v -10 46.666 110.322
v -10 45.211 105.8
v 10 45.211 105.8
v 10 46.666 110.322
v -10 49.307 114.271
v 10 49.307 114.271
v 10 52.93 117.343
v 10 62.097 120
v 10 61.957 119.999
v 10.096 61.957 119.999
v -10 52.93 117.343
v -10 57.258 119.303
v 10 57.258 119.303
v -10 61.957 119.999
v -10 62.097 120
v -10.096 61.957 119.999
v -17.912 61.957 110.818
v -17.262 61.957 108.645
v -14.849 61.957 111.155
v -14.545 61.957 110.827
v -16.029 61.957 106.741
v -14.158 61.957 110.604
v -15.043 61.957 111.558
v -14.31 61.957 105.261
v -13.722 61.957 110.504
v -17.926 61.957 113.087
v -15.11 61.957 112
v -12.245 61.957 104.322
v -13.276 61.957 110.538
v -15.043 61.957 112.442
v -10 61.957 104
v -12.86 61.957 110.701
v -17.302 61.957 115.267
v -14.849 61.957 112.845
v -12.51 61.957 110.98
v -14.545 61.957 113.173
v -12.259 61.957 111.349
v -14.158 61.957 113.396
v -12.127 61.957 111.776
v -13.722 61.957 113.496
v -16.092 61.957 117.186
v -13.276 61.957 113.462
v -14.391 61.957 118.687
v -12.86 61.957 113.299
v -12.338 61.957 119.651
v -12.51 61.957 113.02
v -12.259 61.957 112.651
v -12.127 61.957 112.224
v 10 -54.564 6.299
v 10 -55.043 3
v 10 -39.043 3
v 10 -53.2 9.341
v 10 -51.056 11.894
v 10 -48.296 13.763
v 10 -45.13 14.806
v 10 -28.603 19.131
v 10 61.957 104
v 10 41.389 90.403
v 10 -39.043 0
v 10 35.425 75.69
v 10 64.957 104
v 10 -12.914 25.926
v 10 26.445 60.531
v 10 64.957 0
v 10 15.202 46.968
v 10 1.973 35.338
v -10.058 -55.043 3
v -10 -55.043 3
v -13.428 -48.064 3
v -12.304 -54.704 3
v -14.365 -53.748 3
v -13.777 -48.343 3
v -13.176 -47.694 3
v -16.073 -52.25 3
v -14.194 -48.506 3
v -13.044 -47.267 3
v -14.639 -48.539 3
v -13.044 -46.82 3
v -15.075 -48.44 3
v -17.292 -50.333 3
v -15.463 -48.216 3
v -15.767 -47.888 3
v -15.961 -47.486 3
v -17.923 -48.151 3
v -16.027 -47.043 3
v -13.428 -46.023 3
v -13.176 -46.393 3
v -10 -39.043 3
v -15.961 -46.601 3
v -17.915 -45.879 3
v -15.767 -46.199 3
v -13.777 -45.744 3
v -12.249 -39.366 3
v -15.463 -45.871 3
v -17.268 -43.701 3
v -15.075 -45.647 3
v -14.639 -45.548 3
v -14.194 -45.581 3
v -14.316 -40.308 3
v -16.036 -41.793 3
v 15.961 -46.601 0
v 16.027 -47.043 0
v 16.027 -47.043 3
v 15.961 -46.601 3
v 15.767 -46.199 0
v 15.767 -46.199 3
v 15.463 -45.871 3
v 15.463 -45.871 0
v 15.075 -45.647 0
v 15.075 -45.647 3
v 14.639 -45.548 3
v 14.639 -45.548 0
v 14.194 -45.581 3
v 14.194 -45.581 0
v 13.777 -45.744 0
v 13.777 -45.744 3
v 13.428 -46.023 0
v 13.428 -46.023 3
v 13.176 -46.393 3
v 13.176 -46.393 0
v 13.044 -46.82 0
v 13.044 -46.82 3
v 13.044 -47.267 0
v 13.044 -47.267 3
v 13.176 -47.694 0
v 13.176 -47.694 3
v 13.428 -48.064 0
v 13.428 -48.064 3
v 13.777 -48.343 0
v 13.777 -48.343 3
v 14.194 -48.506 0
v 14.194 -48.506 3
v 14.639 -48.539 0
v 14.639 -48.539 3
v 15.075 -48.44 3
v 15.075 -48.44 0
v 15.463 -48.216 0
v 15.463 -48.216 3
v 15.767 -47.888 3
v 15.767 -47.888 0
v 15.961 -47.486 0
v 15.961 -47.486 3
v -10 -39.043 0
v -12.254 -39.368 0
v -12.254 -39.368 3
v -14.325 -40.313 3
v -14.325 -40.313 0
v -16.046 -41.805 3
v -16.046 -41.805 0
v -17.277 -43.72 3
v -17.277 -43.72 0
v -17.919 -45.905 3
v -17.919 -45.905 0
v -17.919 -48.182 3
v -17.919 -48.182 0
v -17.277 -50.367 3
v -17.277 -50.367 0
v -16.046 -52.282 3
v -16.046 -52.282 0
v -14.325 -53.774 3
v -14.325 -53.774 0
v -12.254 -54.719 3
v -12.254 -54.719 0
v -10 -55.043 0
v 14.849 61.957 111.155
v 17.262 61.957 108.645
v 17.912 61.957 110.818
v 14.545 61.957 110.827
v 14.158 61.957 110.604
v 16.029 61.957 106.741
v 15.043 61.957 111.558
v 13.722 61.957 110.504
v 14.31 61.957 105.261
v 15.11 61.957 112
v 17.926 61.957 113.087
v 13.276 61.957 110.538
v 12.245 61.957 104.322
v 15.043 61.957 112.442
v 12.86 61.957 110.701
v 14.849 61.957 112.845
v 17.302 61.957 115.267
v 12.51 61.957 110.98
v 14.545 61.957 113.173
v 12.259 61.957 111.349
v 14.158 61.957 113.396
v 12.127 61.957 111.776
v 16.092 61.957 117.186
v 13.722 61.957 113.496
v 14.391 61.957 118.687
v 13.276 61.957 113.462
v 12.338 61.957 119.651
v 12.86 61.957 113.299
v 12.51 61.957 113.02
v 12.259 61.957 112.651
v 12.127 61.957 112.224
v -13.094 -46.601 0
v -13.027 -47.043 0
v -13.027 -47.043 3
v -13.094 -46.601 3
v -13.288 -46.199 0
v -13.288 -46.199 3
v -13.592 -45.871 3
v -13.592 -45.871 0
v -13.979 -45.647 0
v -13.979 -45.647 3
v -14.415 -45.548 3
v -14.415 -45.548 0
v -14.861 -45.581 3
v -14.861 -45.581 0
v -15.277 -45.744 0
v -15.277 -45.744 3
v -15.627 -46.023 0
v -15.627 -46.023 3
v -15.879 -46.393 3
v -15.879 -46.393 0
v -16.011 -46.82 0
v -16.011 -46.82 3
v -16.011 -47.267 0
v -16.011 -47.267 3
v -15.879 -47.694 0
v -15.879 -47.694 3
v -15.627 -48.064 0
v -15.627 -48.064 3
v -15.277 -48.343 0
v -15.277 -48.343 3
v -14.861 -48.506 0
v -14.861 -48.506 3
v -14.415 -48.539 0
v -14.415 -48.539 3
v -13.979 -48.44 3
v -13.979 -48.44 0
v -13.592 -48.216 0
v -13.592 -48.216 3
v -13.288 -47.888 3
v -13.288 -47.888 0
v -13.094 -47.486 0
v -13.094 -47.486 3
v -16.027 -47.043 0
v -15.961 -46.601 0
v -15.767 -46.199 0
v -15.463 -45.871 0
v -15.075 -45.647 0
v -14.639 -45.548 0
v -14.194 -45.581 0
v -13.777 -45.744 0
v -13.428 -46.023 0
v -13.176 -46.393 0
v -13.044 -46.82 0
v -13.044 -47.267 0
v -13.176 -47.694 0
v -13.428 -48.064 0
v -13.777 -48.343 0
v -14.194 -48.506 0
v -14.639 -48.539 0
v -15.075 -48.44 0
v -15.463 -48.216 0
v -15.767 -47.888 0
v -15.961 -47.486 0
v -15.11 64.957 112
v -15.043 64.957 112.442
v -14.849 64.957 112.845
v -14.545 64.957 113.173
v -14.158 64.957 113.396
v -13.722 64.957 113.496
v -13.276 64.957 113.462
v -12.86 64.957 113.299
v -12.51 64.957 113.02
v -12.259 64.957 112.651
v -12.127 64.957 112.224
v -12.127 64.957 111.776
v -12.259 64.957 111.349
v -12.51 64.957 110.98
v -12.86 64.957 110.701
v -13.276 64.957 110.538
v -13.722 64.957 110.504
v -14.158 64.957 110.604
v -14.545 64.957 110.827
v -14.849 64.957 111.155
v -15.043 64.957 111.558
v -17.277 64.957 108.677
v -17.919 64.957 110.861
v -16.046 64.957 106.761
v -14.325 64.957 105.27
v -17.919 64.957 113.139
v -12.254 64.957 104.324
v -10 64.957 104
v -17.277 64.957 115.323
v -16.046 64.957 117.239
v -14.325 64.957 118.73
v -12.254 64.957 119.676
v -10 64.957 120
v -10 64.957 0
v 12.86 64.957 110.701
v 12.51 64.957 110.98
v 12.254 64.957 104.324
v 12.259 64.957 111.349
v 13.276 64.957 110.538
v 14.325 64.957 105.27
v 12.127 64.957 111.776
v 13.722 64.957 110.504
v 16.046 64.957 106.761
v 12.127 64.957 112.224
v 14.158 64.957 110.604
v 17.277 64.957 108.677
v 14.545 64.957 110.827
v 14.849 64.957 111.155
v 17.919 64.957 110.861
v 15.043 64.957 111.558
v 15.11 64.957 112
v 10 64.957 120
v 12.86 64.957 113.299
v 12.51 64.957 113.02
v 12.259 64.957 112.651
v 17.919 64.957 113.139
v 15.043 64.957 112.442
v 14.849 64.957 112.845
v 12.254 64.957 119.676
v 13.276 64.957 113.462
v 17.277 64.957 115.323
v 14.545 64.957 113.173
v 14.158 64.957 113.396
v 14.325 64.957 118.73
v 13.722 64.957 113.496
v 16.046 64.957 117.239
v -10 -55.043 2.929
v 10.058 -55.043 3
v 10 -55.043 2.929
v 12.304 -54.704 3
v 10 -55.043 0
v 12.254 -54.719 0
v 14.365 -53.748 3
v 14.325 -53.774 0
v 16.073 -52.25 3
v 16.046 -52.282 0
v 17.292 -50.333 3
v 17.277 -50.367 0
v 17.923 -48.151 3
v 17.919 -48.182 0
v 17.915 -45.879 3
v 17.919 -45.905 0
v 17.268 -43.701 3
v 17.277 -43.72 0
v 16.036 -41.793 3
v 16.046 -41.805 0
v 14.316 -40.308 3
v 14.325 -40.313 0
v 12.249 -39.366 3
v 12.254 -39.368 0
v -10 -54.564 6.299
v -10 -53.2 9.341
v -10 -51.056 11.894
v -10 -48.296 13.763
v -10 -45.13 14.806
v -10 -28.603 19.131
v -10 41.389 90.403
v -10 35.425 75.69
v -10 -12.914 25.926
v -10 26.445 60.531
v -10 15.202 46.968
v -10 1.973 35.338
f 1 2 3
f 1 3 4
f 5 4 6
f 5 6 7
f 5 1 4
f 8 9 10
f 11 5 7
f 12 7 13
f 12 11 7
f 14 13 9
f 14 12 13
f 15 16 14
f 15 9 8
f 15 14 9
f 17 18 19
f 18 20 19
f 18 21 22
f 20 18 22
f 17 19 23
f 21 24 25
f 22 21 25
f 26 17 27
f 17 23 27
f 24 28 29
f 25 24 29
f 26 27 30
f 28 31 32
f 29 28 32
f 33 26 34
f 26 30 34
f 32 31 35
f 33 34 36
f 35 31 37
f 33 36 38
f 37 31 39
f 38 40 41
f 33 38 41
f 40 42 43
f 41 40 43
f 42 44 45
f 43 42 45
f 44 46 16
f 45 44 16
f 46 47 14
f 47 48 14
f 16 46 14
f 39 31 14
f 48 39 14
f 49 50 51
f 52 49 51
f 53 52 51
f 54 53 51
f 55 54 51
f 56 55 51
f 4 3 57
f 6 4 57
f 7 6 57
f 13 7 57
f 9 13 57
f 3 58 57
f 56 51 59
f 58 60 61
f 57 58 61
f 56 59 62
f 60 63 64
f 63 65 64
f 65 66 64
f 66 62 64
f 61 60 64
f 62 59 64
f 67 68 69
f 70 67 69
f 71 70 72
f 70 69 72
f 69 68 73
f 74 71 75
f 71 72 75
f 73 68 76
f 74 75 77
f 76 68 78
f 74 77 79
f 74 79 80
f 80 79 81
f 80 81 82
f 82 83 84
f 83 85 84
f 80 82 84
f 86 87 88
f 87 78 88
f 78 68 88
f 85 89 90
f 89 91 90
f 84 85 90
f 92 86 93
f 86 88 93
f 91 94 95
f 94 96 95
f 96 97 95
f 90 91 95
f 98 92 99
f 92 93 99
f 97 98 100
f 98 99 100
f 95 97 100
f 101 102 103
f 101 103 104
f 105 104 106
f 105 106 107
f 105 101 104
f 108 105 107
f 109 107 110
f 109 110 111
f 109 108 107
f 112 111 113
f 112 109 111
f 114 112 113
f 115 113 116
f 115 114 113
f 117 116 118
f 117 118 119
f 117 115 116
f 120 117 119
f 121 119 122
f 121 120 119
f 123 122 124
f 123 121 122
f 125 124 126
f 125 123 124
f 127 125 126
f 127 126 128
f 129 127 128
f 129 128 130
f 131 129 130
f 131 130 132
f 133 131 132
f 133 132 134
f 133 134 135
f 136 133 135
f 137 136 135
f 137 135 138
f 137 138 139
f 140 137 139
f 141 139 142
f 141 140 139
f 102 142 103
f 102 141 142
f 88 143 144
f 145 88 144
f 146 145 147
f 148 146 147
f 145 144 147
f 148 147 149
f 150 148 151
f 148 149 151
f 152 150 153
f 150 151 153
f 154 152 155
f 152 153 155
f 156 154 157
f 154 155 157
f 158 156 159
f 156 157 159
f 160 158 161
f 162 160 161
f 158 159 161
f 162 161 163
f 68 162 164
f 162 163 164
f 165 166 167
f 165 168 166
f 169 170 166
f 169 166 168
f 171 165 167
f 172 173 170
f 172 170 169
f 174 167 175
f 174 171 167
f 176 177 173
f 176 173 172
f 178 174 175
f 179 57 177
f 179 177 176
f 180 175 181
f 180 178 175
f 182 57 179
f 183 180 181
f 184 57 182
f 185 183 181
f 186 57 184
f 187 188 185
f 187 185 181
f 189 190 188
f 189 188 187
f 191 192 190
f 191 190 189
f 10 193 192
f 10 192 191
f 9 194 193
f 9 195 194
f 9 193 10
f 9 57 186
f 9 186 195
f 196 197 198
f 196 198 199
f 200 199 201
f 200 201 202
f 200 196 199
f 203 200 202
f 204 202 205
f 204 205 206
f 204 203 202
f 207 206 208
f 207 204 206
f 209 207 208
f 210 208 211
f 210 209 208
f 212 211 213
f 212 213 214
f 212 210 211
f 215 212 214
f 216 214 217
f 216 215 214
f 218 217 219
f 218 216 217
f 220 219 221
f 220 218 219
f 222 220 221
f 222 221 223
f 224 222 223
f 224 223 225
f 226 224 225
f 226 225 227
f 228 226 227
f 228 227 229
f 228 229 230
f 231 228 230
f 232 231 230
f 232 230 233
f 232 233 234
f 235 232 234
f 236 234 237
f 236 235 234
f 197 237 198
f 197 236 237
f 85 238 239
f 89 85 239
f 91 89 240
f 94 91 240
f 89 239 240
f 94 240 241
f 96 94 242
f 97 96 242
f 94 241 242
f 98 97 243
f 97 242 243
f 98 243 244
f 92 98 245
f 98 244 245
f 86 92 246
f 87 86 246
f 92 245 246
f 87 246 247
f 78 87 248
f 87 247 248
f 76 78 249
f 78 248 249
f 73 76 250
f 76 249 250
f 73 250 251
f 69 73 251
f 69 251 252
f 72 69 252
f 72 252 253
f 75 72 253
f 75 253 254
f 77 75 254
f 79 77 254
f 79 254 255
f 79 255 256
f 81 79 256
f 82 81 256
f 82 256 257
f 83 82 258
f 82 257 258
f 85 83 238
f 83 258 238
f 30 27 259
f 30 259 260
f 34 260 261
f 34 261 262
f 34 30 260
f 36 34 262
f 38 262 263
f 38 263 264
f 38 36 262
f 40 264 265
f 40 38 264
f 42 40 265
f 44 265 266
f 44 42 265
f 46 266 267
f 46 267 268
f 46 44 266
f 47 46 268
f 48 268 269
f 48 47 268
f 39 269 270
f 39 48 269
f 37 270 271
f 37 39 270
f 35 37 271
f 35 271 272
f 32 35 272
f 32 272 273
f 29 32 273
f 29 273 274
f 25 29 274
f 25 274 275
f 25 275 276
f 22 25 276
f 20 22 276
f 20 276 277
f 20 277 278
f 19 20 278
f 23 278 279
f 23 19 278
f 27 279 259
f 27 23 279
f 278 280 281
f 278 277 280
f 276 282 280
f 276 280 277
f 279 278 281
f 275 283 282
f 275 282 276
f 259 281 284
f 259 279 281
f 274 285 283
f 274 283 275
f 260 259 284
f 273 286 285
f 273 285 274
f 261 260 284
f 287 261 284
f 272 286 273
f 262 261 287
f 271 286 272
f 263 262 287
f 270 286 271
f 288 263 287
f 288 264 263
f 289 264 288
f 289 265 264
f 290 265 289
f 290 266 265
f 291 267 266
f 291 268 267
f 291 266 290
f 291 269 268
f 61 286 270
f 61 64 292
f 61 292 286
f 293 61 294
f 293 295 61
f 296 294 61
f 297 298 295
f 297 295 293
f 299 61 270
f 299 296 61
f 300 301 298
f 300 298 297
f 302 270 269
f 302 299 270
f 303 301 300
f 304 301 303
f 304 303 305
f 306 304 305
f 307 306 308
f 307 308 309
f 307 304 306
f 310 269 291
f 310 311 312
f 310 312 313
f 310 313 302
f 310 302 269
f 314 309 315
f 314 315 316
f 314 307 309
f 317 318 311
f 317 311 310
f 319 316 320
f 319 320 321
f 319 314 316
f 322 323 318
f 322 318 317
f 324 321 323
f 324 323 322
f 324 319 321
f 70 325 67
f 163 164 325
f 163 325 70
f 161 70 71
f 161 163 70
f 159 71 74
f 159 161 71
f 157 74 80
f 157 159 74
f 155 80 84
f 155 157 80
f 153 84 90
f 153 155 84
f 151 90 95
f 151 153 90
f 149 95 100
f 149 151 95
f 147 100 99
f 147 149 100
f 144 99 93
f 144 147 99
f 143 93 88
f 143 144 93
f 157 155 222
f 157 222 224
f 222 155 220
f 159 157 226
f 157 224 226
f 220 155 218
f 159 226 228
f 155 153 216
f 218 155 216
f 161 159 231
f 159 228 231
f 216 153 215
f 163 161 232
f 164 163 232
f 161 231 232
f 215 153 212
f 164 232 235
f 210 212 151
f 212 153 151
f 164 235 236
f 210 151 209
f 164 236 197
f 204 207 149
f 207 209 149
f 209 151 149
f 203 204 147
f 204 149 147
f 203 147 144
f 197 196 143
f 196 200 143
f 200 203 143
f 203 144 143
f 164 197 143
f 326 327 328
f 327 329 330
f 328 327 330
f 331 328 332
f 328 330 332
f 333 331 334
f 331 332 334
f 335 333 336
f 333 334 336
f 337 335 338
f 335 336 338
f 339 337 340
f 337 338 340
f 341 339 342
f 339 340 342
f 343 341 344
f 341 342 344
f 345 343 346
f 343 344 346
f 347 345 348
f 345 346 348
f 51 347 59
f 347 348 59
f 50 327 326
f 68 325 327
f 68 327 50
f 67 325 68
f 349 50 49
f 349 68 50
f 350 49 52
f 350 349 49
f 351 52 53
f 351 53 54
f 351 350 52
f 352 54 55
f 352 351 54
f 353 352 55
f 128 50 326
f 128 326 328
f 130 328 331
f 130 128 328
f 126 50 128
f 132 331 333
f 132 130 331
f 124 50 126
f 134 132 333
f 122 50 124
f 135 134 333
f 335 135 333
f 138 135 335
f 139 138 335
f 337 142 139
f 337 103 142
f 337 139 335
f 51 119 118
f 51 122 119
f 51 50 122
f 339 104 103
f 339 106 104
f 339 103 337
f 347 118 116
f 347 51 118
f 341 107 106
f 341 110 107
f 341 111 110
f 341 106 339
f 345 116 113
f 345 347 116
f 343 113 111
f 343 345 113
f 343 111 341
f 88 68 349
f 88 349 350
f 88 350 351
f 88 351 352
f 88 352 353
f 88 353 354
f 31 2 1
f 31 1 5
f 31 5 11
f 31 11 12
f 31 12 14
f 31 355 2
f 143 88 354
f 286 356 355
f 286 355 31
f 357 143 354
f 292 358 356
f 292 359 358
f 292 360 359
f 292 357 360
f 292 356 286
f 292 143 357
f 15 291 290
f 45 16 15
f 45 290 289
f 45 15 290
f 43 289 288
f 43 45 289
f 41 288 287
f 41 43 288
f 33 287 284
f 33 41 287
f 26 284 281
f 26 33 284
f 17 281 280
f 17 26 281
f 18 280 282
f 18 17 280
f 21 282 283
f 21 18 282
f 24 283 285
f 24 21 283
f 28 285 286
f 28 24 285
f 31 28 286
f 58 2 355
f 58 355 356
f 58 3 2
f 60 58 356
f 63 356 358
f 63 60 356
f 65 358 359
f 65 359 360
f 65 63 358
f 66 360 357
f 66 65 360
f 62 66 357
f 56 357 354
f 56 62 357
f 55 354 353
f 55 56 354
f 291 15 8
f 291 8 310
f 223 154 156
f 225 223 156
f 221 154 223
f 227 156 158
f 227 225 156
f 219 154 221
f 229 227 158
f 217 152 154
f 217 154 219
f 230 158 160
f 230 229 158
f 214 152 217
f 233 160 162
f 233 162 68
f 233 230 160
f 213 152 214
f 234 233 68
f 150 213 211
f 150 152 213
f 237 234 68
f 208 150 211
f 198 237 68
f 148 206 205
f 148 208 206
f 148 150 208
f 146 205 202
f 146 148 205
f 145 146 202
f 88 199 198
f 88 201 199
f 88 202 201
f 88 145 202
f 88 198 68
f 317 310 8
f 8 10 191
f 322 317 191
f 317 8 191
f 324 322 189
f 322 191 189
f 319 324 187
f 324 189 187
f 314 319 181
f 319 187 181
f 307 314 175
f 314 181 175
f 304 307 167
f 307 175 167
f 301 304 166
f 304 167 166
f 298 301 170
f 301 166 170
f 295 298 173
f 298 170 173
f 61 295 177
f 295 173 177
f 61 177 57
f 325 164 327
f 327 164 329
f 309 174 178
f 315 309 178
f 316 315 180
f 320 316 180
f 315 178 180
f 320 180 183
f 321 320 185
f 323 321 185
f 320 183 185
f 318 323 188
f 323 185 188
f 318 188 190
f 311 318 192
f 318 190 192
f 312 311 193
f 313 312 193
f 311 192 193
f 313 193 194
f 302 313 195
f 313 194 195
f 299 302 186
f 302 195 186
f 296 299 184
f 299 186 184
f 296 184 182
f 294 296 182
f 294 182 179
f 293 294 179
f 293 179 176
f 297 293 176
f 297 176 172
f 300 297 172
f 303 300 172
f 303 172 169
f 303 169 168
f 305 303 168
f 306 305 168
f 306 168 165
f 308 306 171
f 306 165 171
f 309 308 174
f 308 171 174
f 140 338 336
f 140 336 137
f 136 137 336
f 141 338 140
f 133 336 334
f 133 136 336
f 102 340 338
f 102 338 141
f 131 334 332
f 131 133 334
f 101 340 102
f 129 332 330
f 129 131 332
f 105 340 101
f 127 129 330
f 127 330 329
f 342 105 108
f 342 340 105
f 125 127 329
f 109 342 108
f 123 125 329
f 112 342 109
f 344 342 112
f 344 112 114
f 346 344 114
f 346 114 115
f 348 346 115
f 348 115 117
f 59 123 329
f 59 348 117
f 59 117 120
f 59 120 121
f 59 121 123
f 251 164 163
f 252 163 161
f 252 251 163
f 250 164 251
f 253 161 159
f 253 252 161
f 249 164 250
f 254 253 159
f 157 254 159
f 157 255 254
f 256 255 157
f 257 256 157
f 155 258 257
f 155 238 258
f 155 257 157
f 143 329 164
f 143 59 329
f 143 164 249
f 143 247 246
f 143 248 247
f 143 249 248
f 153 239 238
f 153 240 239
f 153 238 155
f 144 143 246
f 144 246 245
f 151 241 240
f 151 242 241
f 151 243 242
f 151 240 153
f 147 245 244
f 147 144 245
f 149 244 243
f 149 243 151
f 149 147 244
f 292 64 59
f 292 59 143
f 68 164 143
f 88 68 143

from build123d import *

# Parameters (mm, degrees)
F1_DEPTH     = 15
F0_R         = 1.5
F2_DEPTH     = 3
F0_W         = 2
F0_H         = 3
F3_DEPTH     = 120
F4_DEPTH     = 120
F5_W         = 3
F5_H         = 16
F6_DEPTH     = 17
F8_DEPTH     = 3
F7_R         = 1.5
F9_DEPTH     = 3
F12_T1_DEPTH = 105.7045814642
F13_T1_DEPTH = 80.3553390593
F14_R        = 112.0195092941


# Not quite as in the source:
# - a fillet or chamfer that OpenCascade refuses, or shapes differently, is made with other operations: its cross-section is extruded or revolved along the edge and cut away or added
# - a feature names something its author has since deleted; it is built from what else it names


with BuildPart() as f1:
    # F0 (on Top) → F1 (new body)
    with BuildSketch(Plane.XY):
        Polygon((-8, 44.9565169007), (-10, 44.9565169007), (-10, -39.0434830993), (-10, -55.0434830993), (-8, -55.0434830993), align=None)
        Polygon((10, -39.0434830993), (10, 44.9565169007), (-8, 44.9565169007), (-8, -55.0434830993), (10, -55.0434830993), align=None)
    extrude(amount=F1_DEPTH)

    # F0 (on Top) → F2 (join)
    with BuildSketch(Plane.XY):
        Polygon((10, -39.0434830993), (10, 44.9565169007), (-8, 44.9565169007), (-8, -55.0434830993), (10, -55.0434830993), align=None)
        with BuildLine():
            ThreePointArc((10, -55.0434830993), (18, -47.0434830993), (10, -39.0434830993))
            Line((10, -39.0434830993), (10, -55.0434830993))
        make_face()
        with Locations((14.5272817463, -47.0434830993)):
            Circle(F0_R, mode=Mode.SUBTRACT)
    extrude(amount=F2_DEPTH)

    # F0 (on Top) → F3 (join)
    with BuildSketch(Plane.XY):
        Polygon((10, 64.9565169007), (-8, 64.9565169007), (-8, 61.9565169007), (-8, 44.9565169007), (10, 44.9565169007), align=None)
        with Locations((-9, 63.4565169007)):
            Rectangle(F0_W, F0_H)
    extrude(amount=F3_DEPTH)

    # F0 (on Top) → F4 (join, through all)
    with BuildSketch(Plane.XY):
        with Locations((-9, 63.4565169007)):
            Rectangle(F0_W, F0_H)
    extrude(amount=F4_DEPTH)

    # F5 (on face) → F6 (join)
    with BuildSketch(Plane.YZ.offset(10)):
        with Locations((63.4565169007, 112)):
            Rectangle(F5_W, F5_H)
    extrude(amount=F6_DEPTH)

    # F7 (on face) → F8 (cut, through all)
    with BuildSketch(Plane.XZ.offset(-61.9565169007)):
        with BuildLine():
            ThreePointArc((10, 120), (18, 112), (10, 104))
            Line((10, 104), (27, 104))
            Line((27, 104), (27, 120))
            Line((27, 120), (10, 120))
        make_face()
    extrude(amount=-F8_DEPTH, mode=Mode.SUBTRACT)

    # F7 (on face) → F9 (cut, through all)
    with BuildSketch(Plane.XZ.offset(-61.9565169007)):
        with Locations((13.6100761592, 112)):
            Circle(F7_R)
    extrude(amount=-F9_DEPTH, mode=Mode.SUBTRACT)

    # F11: F1 across plane


with BuildPart() as f2:
    # F0 (on Top) → F2, piece 2 (new body)
    with BuildSketch(Plane.XY):
        with BuildLine():
            Line((-10, -55.0434830993), (-10, -39.0434830993))
            ThreePointArc((-10, -39.0434830993), (-18, -47.0434830993), (-10, -55.0434830993))
        make_face()
        with Locations((-14.5272817463, -47.0434830993)):
            Circle(F0_R, mode=Mode.SUBTRACT)
    extrude(amount=F2_DEPTH)


with BuildPart() as f1_1:
    add(f1.part)
    add(f1.part.mirror(Plane(origin=(0, 64.9565169007, 120), x_dir=(0, 1, 0), z_dir=(1, 0, 0))))

    # F12: fillet of radius 17.1409162928 on 1 edges, made by hand

    # F12_s2 → F12_t1 (cut)
    with BuildSketch(Plane.YZ.offset(-52.8522907321)):
        with BuildLine():
            ThreePointArc((44.9565169007, 102.8590837072), (49.9769750471, 114.9795418536), (62.0974331935, 120))
            Line((62.0974331935, 120), (44.9565169007, 120))
            Line((44.9565169007, 120), (44.9565169007, 102.8590837072))
        make_face()
    extrude(amount=F12_T1_DEPTH, mode=Mode.SUBTRACT)

    # F13: fillet of radius 12.0710678119 on 1 edges, made by hand

    # F13_s2 → F13_t1 (cut)
    with BuildSketch(Plane.YZ.offset(-40.1776695297)):
        with BuildLine():
            ThreePointArc((-55.0434830993, 2.9289321881), (-51.5079491934, 11.4644660941), (-42.9724152874, 15))
            Line((-42.9724152874, 15), (-55.0434830993, 15))
            Line((-55.0434830993, 15), (-55.0434830993, 2.9289321881))
        make_face()
    extrude(amount=F13_T1_DEPTH, mode=Mode.SUBTRACT)

    # F14
    f14_edges = [f1_1.edges().sort_by_distance(p)[0] for p in [
        (0, 44.956517, 15),
    ]]
    fillet(f14_edges, radius=F14_R)


solid = Compound([f2.part, f1_1.part])
